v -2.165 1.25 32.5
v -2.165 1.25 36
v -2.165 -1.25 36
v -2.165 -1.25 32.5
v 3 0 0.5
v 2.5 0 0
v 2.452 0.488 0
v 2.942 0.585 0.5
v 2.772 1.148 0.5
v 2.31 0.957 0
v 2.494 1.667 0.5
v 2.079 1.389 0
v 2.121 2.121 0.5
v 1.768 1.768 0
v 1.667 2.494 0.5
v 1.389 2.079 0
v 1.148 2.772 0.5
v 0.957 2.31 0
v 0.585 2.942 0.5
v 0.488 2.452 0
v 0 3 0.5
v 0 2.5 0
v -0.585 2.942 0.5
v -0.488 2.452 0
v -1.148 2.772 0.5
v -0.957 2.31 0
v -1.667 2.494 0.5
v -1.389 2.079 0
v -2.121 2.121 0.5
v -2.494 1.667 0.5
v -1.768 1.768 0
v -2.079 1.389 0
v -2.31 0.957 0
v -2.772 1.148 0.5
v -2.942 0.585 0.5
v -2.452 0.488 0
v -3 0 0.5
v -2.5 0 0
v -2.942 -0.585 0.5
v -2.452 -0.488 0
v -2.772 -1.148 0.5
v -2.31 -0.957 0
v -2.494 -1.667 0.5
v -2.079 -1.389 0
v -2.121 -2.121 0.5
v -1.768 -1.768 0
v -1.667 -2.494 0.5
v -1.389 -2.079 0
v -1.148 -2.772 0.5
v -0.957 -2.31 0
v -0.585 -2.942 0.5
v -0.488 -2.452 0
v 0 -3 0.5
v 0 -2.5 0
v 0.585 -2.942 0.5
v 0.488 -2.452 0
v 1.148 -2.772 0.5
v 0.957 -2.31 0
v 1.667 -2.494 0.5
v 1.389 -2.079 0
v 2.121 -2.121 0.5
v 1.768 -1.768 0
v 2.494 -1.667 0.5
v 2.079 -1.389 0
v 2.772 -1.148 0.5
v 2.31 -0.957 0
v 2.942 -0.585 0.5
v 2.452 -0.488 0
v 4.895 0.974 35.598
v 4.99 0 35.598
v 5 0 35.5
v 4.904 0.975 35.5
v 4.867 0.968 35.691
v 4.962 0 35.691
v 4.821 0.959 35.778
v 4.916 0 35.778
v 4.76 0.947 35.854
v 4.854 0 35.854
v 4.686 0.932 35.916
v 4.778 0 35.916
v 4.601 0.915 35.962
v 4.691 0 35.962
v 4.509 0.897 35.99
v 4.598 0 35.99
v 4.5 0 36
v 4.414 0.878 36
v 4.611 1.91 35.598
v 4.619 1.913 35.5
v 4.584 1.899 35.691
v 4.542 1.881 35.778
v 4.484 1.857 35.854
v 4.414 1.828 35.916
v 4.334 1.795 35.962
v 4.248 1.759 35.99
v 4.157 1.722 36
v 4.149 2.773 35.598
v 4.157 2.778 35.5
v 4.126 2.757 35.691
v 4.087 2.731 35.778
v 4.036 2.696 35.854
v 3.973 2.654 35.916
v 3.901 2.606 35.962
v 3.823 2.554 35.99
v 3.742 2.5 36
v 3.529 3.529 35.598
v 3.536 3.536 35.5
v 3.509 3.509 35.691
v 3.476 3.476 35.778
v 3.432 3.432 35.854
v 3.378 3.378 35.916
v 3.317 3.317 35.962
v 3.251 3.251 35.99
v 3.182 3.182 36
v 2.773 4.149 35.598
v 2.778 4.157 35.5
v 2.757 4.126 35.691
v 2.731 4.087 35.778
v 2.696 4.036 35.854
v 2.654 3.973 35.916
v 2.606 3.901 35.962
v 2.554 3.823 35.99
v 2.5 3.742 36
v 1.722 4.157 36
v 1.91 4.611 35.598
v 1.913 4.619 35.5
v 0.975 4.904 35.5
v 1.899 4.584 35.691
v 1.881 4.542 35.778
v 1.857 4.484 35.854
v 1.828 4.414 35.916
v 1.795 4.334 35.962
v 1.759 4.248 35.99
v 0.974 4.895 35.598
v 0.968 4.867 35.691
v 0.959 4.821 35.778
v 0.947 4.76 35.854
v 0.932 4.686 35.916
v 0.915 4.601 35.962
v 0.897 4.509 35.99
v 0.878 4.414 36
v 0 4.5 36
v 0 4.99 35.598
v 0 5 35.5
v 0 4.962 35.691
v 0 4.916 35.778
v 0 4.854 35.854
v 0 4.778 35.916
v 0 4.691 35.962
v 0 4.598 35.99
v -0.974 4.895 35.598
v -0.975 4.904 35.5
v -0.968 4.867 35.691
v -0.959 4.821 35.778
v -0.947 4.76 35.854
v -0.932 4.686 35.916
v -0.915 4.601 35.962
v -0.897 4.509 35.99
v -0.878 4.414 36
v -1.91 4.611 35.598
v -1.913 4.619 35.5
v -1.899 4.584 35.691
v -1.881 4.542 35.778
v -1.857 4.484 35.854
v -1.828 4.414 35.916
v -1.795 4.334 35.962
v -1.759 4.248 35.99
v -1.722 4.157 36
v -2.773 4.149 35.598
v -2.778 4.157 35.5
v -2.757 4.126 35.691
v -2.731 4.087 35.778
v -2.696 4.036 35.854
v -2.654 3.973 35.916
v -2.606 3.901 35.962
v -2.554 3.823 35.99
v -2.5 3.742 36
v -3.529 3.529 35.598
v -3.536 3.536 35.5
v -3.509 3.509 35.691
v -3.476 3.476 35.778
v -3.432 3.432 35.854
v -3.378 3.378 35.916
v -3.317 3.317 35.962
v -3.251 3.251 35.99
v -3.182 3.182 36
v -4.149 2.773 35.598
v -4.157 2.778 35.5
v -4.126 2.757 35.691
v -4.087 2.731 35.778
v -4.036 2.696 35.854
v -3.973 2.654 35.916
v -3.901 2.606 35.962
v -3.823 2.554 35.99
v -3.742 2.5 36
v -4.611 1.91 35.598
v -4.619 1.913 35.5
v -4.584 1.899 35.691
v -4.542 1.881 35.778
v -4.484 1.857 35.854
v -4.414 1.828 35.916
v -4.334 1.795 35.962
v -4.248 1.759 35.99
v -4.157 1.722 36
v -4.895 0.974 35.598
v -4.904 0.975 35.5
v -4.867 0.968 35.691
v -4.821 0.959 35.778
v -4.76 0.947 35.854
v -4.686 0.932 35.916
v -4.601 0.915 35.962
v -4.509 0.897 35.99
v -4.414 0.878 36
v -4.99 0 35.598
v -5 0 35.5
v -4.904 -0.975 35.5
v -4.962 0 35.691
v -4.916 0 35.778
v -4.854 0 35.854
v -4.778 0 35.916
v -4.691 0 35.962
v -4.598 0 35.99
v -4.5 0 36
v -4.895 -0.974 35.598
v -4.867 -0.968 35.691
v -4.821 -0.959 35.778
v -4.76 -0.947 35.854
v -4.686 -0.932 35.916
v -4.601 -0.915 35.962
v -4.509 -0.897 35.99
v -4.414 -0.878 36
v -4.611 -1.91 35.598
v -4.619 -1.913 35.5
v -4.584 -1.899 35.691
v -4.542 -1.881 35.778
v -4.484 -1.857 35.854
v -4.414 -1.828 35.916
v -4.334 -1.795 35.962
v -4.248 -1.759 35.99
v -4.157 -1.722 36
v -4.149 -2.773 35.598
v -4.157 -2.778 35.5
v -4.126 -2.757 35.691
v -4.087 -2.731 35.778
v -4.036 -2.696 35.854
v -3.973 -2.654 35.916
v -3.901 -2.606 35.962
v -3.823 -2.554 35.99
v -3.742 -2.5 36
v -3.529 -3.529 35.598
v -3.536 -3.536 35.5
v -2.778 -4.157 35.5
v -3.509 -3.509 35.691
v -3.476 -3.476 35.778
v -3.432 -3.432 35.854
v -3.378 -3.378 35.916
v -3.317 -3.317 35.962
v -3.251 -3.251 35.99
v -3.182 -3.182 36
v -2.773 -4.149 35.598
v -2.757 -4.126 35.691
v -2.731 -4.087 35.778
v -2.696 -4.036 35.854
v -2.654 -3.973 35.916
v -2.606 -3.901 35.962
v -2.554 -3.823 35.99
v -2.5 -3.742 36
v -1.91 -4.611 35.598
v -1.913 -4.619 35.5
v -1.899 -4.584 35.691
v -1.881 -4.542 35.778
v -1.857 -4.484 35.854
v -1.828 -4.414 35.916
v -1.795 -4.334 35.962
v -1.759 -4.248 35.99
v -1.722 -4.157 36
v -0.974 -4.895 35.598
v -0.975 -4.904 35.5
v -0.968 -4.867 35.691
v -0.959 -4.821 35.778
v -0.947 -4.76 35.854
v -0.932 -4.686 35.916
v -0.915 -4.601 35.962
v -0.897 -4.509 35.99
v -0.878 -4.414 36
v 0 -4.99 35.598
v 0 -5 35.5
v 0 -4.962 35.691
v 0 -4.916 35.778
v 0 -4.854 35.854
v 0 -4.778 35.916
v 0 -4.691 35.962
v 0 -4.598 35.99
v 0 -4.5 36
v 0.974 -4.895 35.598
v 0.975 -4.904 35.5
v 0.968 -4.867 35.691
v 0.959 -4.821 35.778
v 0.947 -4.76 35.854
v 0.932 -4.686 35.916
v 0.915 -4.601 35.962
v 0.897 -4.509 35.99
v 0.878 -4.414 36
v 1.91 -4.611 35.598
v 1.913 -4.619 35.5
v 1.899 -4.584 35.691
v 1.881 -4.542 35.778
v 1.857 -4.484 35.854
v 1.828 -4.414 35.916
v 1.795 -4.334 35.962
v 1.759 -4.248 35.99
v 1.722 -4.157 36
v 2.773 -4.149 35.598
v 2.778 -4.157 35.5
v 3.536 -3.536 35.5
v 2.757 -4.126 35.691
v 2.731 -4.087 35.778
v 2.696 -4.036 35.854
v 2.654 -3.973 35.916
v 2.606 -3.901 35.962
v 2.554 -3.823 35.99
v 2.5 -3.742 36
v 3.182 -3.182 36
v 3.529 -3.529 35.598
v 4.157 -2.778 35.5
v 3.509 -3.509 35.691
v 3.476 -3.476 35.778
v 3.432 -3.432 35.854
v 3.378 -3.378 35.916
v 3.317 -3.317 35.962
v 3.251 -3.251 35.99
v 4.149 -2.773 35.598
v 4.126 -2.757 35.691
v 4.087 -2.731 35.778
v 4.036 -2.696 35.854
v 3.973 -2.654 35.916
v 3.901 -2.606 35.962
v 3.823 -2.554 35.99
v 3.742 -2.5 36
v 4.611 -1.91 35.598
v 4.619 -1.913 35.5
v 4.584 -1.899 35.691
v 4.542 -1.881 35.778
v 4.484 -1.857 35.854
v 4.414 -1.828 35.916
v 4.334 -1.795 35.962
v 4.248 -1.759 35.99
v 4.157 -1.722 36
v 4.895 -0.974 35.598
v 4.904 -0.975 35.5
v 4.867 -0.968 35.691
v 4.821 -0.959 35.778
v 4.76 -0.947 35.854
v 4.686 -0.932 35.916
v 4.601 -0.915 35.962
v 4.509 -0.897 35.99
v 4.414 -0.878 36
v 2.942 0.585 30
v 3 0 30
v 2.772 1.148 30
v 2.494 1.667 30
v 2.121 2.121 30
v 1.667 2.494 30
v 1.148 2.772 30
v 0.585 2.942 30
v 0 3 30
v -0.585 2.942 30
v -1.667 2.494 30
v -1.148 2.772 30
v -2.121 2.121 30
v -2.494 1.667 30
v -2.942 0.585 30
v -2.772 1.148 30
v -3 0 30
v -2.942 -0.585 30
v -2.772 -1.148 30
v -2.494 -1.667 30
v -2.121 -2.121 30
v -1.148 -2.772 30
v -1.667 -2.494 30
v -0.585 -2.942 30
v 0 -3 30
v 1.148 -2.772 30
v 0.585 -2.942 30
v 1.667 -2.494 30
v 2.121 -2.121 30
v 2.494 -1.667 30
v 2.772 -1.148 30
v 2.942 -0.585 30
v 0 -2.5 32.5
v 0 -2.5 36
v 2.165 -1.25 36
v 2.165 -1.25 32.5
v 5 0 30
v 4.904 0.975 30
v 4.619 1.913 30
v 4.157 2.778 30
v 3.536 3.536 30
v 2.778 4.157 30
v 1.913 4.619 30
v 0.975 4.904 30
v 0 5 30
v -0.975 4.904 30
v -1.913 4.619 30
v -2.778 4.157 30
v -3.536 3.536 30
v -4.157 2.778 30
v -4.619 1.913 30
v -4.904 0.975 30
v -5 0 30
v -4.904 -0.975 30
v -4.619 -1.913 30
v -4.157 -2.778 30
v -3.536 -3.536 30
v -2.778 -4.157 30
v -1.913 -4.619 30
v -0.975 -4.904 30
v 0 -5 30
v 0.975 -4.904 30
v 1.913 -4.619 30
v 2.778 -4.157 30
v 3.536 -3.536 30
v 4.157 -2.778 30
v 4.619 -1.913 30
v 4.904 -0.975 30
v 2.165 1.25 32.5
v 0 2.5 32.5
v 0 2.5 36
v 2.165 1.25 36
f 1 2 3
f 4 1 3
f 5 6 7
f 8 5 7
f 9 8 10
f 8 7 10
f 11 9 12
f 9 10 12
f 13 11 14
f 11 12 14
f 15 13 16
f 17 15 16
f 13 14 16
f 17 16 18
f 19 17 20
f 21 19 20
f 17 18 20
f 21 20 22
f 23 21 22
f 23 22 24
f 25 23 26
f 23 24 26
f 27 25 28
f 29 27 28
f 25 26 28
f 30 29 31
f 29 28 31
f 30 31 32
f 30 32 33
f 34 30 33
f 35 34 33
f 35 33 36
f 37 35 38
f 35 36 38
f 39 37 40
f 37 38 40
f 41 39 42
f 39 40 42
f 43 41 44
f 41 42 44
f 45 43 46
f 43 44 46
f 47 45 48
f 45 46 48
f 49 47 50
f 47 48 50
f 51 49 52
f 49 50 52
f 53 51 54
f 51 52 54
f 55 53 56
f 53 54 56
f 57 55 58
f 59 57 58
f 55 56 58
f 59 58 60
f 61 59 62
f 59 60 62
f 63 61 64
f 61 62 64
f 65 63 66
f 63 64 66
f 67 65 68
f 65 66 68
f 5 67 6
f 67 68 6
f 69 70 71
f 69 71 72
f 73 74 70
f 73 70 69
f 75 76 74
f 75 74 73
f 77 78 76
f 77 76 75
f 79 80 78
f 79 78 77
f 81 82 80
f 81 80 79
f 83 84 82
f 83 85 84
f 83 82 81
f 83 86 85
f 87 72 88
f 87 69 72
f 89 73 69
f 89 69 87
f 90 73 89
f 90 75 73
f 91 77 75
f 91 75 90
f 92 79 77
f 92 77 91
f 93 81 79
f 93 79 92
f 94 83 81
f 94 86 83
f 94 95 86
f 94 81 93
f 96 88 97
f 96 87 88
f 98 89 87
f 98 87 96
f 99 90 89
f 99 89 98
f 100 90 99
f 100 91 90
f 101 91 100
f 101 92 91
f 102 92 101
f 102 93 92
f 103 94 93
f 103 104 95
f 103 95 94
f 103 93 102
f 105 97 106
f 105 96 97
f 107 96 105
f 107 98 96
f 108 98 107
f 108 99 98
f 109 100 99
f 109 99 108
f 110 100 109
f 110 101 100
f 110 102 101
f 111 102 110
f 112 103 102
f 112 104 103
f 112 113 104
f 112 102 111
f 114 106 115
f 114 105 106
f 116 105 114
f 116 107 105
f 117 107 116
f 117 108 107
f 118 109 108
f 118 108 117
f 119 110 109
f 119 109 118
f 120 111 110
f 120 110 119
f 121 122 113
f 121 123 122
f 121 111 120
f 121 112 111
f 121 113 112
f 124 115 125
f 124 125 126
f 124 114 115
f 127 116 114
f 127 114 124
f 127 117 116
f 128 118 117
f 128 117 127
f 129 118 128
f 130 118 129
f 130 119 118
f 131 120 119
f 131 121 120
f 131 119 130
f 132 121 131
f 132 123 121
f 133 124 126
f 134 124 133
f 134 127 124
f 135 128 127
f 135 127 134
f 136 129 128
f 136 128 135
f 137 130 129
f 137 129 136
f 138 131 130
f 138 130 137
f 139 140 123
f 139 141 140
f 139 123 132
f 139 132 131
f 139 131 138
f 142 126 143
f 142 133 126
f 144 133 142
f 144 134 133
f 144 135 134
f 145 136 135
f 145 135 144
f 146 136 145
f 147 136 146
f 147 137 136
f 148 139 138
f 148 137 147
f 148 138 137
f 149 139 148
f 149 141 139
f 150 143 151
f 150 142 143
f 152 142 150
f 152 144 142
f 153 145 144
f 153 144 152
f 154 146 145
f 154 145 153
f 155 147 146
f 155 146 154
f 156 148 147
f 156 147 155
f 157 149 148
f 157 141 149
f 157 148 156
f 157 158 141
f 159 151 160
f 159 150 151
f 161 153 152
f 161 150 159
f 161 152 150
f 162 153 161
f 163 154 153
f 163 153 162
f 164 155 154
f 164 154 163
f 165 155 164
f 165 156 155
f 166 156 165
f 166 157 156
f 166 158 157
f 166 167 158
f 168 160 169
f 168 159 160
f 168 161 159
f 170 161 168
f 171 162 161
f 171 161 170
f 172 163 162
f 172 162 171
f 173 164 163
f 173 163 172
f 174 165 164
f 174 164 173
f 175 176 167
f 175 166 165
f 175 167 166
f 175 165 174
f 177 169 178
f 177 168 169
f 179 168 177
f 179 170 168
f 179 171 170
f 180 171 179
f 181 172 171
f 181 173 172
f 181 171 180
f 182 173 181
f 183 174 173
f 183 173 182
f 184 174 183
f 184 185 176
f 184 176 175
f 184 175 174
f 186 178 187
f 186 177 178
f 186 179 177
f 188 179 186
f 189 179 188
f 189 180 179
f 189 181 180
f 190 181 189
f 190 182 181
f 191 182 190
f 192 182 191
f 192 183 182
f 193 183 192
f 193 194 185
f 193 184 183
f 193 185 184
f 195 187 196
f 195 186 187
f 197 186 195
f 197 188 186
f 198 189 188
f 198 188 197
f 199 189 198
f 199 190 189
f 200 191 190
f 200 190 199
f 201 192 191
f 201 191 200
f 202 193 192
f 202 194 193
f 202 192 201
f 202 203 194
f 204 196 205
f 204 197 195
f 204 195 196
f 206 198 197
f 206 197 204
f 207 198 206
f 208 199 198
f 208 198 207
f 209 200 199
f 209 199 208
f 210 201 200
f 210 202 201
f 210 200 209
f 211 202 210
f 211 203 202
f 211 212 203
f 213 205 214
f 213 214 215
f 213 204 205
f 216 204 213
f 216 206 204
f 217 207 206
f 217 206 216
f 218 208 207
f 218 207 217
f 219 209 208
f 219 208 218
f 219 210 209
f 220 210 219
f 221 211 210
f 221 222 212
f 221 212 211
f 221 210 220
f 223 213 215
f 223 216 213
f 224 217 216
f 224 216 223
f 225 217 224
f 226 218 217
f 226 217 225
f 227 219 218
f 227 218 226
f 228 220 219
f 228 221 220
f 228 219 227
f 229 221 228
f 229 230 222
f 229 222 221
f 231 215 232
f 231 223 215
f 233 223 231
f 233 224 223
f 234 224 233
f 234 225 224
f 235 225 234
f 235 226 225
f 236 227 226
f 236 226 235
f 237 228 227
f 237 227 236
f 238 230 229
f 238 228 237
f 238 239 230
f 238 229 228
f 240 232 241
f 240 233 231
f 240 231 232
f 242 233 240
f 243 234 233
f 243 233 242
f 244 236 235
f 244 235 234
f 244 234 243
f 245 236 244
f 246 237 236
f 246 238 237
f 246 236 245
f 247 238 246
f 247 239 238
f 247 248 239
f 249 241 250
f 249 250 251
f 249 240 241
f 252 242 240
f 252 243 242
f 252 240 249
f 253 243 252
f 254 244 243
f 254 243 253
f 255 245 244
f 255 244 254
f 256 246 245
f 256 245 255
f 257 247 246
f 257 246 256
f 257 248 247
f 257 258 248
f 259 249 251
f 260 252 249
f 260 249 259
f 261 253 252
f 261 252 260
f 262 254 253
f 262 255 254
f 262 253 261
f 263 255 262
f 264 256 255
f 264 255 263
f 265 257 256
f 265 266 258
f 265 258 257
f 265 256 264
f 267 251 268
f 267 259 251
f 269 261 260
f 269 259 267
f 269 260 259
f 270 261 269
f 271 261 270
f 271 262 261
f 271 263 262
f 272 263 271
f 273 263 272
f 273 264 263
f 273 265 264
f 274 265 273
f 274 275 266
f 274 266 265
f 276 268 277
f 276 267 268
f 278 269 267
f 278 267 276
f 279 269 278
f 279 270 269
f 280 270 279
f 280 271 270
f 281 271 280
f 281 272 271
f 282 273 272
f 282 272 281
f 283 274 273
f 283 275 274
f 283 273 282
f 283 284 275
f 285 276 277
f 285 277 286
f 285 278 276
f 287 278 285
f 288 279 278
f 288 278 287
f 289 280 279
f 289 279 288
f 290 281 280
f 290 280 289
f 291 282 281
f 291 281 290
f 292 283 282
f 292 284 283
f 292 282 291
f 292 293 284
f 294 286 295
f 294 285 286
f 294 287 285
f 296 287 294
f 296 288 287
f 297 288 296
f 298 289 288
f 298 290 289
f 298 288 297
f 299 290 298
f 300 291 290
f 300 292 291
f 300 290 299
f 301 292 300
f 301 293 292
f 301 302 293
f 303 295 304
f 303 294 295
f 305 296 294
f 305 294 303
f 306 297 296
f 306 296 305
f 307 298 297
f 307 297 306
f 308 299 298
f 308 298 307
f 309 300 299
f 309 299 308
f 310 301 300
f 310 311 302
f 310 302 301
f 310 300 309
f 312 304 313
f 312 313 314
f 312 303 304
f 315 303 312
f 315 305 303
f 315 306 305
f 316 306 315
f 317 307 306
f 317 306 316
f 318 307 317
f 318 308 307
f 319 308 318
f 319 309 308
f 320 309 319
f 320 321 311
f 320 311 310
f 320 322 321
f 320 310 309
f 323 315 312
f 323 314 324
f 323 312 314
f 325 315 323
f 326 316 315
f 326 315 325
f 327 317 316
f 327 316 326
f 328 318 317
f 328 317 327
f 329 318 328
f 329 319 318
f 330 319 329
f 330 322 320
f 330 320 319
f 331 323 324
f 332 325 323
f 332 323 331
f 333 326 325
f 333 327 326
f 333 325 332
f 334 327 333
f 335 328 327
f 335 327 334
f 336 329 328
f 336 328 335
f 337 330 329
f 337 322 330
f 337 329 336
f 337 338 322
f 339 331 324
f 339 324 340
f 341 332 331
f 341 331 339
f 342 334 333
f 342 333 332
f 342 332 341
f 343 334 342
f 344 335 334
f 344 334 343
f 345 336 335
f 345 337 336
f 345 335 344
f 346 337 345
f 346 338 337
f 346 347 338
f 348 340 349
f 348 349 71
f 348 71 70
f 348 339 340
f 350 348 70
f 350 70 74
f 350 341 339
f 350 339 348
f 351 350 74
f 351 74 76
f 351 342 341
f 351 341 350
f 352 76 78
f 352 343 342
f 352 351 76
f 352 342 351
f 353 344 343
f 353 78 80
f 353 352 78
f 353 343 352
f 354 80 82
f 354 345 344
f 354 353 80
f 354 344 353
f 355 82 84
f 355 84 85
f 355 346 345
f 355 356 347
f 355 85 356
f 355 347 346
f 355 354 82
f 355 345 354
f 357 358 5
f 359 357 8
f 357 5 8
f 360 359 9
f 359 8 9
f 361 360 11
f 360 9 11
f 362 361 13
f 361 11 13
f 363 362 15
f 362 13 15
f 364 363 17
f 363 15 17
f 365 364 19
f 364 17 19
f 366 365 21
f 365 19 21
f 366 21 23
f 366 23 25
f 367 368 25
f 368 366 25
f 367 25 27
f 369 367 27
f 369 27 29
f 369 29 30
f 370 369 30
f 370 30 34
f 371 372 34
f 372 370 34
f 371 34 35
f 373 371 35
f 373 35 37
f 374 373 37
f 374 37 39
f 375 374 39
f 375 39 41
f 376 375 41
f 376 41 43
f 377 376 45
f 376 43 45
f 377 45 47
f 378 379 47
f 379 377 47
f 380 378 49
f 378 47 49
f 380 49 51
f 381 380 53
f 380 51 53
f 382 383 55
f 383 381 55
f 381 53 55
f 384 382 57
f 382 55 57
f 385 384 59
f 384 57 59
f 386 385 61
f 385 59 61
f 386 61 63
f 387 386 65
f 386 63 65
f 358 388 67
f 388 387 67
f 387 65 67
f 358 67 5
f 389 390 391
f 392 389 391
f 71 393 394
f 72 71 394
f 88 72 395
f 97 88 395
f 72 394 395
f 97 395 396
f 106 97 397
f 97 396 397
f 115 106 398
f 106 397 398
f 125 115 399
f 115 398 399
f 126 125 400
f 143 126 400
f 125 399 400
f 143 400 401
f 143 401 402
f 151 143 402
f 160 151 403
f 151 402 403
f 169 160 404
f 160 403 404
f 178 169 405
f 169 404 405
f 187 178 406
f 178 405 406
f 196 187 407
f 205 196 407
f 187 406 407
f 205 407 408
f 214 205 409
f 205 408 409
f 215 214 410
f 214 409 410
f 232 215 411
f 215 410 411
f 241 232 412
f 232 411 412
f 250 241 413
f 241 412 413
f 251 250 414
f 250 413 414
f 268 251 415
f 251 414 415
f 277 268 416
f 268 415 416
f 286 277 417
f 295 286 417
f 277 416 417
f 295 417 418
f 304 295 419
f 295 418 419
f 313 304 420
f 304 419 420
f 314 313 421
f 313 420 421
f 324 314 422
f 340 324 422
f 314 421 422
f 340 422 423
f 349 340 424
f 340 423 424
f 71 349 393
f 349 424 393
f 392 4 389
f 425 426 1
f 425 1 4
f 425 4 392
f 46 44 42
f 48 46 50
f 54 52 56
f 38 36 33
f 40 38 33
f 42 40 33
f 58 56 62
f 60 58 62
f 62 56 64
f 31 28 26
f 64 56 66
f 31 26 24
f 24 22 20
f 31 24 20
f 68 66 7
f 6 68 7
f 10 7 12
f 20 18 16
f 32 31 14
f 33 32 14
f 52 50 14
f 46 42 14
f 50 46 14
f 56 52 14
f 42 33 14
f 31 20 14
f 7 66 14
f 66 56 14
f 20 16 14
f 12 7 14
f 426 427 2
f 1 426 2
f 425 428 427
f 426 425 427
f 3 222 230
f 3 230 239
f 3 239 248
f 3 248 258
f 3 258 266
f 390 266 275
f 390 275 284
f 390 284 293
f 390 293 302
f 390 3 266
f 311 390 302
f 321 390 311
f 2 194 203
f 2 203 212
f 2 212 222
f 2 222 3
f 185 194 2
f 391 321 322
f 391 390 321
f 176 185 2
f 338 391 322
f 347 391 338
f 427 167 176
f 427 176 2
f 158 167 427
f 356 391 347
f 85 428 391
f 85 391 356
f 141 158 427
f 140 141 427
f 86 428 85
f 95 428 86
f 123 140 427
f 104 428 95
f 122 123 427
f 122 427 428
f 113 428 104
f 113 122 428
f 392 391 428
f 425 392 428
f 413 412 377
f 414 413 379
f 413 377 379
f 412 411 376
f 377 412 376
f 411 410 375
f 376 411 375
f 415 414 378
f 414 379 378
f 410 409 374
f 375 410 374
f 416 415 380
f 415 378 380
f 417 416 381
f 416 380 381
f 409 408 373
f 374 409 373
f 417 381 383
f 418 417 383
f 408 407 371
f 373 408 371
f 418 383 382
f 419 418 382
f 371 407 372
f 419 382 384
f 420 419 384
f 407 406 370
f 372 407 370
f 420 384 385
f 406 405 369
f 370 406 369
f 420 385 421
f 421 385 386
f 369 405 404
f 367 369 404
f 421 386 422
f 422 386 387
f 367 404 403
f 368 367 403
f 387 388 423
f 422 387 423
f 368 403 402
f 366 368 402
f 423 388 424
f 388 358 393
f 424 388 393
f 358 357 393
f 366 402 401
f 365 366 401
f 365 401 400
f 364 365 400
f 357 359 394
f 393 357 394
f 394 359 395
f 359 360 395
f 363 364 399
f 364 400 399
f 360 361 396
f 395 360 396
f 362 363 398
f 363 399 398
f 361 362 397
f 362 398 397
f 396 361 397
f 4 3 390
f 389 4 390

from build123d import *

# Parameters (mm, degrees)
ESQUISSE1_R             = 3
BASE_EXTRUSION_DEPTH    = 36
CHANFREIN1_SIZE         = 0.5
ESQUISSE2_R             = 5
BOSS_EXTRU_1_DEPTH      = 6
ENL_V_MAT_EXTRU_1_DEPTH = 3.5
CONG_2_R                = 0.5


with BuildPart() as part:
    # Esquisse1 → Base-Extrusion (new body)
    with BuildSketch(Plane.XY):
        Circle(ESQUISSE1_R)
    extrude(amount=BASE_EXTRUSION_DEPTH)

    # Chanfrein1
    chanfrein1_edges = [part.edges().sort_by_distance(p)[0] for p in [
        (-3, 0, 0),
    ]]
    chamfer(chanfrein1_edges, length=CHANFREIN1_SIZE)

    # Esquisse2 → Boss.-Extru.1 (add)
    with BuildSketch(Plane.XY.offset(30)):
        Circle(ESQUISSE2_R)
    extrude(amount=BOSS_EXTRU_1_DEPTH)

    # Esquisse3 → Enlèv. mat.-Extru.1 (cut)
    with BuildSketch(Plane.XY.offset(36)):
        Polygon((0, 2.5), (-2.165063509, 1.25), (-2.165063509, -1.25), (0, -2.5), (2.165063509, -1.25), (2.165063509, 1.25), align=None)
    extrude(amount=-ENL_V_MAT_EXTRU_1_DEPTH, mode=Mode.SUBTRACT)

    # Congé2
    cong_2_edges = [part.edges().sort_by_distance(p)[0] for p in [
        (-5, 0, 36),
    ]]
    fillet(cong_2_edges, radius=CONG_2_R)


solid = part.part
